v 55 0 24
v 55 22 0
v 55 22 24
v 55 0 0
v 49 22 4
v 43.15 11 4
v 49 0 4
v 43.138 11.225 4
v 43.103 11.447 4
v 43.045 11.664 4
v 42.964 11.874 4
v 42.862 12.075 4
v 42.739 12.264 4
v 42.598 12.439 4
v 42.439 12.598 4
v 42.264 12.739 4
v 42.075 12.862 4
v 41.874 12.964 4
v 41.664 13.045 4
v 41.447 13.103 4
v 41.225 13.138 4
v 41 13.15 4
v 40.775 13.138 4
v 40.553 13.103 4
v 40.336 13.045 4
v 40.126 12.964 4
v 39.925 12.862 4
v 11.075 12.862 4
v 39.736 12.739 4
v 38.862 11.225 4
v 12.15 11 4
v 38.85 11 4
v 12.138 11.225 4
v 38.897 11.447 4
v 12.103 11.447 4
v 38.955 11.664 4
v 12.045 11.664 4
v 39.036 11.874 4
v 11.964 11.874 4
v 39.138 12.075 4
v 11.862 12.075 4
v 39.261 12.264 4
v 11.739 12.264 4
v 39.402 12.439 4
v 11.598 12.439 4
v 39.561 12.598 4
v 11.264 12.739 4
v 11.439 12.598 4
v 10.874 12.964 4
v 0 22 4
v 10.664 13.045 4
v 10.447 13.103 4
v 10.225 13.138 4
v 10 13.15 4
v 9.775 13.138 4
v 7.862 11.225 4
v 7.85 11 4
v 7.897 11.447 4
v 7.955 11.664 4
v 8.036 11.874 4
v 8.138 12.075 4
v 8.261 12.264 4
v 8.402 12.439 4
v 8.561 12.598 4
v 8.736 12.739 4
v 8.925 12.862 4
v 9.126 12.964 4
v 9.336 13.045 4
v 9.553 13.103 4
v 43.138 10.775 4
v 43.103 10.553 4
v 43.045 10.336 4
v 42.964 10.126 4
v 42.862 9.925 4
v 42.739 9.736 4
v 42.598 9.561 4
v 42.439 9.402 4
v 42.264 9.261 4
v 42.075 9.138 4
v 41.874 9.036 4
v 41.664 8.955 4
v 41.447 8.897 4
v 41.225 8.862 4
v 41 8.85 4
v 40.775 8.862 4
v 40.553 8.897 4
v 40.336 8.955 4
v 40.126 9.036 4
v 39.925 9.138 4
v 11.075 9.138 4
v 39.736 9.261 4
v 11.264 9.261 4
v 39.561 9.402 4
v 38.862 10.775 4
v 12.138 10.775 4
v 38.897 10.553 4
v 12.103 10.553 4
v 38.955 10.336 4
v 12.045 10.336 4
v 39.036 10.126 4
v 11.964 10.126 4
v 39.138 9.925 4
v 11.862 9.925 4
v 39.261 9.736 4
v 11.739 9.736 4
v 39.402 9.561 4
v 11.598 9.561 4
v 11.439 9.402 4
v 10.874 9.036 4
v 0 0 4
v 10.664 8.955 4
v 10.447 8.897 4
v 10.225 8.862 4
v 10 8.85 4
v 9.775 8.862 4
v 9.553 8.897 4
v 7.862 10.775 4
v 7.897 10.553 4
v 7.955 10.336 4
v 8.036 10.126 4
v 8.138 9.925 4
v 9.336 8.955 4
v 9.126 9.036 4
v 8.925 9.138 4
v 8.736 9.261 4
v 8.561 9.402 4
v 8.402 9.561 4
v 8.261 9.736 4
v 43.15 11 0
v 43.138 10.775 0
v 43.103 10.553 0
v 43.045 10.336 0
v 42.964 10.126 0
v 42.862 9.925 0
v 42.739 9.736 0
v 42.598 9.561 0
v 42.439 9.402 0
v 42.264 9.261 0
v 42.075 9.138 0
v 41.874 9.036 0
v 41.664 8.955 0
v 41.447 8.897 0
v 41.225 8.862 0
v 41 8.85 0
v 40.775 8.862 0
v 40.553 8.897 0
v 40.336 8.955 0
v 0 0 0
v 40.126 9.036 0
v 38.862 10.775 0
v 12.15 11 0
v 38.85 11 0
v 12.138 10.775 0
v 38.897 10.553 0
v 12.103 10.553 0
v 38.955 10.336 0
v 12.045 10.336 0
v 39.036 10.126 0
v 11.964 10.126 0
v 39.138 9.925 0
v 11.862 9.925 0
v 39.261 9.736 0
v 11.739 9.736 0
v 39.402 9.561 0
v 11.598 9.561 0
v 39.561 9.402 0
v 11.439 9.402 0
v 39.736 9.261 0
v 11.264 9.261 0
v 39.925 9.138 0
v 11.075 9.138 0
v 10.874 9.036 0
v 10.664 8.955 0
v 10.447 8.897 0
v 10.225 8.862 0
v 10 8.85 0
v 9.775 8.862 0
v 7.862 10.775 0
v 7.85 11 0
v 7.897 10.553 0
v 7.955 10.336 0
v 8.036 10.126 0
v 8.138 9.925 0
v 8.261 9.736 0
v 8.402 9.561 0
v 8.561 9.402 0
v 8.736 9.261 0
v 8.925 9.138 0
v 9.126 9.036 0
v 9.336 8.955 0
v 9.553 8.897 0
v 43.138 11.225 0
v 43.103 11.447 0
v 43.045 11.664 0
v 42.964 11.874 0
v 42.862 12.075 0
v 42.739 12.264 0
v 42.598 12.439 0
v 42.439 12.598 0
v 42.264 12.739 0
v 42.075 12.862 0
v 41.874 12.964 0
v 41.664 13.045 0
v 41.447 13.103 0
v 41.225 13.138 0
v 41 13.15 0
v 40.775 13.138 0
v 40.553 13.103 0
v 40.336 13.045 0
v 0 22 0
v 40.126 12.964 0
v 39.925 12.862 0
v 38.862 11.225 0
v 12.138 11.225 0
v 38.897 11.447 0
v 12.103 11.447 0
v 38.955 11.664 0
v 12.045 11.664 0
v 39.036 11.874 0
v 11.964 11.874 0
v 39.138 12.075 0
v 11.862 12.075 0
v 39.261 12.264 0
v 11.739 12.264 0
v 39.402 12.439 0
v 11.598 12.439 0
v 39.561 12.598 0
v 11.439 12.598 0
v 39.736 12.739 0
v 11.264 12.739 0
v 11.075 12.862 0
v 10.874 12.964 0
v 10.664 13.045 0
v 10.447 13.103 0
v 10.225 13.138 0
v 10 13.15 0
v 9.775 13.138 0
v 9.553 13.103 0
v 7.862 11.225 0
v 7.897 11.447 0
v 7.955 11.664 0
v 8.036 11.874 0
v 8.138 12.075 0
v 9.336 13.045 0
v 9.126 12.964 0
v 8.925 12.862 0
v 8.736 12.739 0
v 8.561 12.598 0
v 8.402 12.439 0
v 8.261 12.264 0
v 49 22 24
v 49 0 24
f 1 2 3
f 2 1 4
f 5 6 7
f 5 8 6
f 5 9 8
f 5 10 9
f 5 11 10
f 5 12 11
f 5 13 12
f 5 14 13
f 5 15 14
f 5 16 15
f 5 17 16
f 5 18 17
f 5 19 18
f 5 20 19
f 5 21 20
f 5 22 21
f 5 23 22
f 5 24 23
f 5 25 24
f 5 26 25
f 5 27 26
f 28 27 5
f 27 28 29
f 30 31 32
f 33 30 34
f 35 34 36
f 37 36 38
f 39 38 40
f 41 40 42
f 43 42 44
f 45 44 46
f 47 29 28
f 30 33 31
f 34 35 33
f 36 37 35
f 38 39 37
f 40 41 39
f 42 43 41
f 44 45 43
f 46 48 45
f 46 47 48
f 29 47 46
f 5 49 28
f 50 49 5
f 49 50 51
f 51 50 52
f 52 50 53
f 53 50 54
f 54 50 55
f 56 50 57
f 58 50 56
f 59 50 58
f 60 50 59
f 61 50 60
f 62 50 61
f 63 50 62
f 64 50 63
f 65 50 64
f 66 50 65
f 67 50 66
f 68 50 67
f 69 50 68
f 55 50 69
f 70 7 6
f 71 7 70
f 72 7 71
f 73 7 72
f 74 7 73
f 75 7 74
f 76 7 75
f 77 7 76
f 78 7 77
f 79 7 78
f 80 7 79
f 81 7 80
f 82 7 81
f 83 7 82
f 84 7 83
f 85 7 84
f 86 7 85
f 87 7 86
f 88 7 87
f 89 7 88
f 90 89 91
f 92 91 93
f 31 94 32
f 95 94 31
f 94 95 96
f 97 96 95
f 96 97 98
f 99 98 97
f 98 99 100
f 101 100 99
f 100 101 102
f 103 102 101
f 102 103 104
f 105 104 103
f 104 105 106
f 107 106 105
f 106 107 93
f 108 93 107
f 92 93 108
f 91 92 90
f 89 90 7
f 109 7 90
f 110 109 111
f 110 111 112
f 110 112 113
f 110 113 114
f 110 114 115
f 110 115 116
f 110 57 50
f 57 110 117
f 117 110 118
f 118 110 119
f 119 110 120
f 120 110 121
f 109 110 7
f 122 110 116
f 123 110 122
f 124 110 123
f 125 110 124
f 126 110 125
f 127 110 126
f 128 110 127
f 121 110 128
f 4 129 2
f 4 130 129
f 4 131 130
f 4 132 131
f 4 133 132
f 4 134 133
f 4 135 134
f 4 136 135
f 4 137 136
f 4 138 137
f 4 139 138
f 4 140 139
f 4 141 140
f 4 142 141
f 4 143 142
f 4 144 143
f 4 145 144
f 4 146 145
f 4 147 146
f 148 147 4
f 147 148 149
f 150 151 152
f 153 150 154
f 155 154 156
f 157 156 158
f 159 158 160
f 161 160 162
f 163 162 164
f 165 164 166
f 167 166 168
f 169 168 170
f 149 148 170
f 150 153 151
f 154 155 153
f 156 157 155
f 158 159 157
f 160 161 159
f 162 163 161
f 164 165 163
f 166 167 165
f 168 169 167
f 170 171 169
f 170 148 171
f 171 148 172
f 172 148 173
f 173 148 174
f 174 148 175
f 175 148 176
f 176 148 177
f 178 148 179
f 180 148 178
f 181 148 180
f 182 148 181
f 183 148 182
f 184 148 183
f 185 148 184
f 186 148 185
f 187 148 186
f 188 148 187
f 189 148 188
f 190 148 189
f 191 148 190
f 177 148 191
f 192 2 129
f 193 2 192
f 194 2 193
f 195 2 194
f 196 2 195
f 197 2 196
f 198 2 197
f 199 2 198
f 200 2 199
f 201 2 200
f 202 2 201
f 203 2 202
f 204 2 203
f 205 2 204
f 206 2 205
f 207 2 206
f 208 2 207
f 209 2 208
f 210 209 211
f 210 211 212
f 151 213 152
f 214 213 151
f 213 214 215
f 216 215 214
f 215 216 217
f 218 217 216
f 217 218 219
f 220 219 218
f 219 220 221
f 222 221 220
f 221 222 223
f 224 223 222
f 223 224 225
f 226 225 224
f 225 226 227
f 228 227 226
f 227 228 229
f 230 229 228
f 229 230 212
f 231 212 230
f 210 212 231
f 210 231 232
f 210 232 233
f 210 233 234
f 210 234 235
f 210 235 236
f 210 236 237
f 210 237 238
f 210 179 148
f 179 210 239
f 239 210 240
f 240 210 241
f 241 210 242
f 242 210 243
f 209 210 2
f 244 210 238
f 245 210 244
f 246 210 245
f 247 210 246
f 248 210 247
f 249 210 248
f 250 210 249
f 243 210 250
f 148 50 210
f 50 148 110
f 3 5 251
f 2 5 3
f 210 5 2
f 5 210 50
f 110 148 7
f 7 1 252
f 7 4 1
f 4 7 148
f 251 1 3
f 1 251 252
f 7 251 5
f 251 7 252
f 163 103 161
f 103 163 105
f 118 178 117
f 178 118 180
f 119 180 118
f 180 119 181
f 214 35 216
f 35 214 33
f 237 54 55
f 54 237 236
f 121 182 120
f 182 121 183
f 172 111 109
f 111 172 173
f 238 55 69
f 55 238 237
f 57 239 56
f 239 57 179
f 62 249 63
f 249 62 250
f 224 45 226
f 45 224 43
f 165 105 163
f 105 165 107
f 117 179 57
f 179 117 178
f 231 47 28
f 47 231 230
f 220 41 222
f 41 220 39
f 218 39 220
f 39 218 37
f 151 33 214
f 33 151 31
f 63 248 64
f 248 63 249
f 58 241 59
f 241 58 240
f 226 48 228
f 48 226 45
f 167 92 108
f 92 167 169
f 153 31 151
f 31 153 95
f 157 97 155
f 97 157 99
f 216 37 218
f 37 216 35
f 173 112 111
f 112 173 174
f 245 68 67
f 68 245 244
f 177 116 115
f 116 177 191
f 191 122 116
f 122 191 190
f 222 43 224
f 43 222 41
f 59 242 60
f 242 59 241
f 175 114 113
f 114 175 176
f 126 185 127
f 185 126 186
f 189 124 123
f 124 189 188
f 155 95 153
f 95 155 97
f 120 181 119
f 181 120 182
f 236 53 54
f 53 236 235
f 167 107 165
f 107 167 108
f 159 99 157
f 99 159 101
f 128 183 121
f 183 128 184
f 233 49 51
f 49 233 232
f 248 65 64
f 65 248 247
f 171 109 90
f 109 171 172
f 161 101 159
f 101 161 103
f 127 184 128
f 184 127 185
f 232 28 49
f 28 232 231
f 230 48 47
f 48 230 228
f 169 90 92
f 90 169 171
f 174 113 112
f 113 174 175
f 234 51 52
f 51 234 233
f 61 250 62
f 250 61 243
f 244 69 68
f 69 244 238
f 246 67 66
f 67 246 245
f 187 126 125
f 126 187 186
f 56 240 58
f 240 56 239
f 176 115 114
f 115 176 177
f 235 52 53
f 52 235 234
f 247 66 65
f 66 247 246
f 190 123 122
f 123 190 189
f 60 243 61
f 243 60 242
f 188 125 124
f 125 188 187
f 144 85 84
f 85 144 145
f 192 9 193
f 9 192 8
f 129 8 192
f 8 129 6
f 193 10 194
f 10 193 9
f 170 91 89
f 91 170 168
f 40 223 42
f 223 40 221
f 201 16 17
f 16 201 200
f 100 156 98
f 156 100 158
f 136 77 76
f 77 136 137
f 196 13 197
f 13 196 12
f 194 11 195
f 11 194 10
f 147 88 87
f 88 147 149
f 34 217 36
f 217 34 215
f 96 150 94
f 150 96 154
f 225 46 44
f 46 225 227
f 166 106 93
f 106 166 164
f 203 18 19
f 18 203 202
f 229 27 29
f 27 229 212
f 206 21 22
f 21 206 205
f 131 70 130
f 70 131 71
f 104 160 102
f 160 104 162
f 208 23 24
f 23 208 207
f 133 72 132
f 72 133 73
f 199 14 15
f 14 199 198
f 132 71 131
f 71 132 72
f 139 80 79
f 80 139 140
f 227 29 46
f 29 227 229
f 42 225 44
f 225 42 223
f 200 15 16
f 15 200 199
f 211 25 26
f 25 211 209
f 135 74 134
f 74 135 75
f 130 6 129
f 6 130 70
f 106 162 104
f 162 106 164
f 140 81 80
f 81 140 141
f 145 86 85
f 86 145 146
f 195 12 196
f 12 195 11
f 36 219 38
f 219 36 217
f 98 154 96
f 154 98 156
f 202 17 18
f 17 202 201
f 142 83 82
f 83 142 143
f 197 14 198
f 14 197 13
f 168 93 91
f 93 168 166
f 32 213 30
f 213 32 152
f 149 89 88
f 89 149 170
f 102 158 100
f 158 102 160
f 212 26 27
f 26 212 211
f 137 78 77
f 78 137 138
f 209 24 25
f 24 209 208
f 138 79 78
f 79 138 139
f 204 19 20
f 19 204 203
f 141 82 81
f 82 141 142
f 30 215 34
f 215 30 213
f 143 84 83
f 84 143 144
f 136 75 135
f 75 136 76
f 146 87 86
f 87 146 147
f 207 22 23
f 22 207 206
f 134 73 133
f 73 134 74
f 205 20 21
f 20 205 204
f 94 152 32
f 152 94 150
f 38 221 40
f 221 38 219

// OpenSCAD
// Latch catch plate.
$fn = 60;
eps = 0.02;
length = 55;
height = 20;
width = 22;
thickness = 4;
difference() {
    union() { cube([length,width,thickness]); translate([length-6,0,thickness]) cube([6,width,height]); }
    for(x=[10,length-14]) translate([x,width/2,-eps]) cylinder(d=4.3,h=thickness+2*eps);
}
